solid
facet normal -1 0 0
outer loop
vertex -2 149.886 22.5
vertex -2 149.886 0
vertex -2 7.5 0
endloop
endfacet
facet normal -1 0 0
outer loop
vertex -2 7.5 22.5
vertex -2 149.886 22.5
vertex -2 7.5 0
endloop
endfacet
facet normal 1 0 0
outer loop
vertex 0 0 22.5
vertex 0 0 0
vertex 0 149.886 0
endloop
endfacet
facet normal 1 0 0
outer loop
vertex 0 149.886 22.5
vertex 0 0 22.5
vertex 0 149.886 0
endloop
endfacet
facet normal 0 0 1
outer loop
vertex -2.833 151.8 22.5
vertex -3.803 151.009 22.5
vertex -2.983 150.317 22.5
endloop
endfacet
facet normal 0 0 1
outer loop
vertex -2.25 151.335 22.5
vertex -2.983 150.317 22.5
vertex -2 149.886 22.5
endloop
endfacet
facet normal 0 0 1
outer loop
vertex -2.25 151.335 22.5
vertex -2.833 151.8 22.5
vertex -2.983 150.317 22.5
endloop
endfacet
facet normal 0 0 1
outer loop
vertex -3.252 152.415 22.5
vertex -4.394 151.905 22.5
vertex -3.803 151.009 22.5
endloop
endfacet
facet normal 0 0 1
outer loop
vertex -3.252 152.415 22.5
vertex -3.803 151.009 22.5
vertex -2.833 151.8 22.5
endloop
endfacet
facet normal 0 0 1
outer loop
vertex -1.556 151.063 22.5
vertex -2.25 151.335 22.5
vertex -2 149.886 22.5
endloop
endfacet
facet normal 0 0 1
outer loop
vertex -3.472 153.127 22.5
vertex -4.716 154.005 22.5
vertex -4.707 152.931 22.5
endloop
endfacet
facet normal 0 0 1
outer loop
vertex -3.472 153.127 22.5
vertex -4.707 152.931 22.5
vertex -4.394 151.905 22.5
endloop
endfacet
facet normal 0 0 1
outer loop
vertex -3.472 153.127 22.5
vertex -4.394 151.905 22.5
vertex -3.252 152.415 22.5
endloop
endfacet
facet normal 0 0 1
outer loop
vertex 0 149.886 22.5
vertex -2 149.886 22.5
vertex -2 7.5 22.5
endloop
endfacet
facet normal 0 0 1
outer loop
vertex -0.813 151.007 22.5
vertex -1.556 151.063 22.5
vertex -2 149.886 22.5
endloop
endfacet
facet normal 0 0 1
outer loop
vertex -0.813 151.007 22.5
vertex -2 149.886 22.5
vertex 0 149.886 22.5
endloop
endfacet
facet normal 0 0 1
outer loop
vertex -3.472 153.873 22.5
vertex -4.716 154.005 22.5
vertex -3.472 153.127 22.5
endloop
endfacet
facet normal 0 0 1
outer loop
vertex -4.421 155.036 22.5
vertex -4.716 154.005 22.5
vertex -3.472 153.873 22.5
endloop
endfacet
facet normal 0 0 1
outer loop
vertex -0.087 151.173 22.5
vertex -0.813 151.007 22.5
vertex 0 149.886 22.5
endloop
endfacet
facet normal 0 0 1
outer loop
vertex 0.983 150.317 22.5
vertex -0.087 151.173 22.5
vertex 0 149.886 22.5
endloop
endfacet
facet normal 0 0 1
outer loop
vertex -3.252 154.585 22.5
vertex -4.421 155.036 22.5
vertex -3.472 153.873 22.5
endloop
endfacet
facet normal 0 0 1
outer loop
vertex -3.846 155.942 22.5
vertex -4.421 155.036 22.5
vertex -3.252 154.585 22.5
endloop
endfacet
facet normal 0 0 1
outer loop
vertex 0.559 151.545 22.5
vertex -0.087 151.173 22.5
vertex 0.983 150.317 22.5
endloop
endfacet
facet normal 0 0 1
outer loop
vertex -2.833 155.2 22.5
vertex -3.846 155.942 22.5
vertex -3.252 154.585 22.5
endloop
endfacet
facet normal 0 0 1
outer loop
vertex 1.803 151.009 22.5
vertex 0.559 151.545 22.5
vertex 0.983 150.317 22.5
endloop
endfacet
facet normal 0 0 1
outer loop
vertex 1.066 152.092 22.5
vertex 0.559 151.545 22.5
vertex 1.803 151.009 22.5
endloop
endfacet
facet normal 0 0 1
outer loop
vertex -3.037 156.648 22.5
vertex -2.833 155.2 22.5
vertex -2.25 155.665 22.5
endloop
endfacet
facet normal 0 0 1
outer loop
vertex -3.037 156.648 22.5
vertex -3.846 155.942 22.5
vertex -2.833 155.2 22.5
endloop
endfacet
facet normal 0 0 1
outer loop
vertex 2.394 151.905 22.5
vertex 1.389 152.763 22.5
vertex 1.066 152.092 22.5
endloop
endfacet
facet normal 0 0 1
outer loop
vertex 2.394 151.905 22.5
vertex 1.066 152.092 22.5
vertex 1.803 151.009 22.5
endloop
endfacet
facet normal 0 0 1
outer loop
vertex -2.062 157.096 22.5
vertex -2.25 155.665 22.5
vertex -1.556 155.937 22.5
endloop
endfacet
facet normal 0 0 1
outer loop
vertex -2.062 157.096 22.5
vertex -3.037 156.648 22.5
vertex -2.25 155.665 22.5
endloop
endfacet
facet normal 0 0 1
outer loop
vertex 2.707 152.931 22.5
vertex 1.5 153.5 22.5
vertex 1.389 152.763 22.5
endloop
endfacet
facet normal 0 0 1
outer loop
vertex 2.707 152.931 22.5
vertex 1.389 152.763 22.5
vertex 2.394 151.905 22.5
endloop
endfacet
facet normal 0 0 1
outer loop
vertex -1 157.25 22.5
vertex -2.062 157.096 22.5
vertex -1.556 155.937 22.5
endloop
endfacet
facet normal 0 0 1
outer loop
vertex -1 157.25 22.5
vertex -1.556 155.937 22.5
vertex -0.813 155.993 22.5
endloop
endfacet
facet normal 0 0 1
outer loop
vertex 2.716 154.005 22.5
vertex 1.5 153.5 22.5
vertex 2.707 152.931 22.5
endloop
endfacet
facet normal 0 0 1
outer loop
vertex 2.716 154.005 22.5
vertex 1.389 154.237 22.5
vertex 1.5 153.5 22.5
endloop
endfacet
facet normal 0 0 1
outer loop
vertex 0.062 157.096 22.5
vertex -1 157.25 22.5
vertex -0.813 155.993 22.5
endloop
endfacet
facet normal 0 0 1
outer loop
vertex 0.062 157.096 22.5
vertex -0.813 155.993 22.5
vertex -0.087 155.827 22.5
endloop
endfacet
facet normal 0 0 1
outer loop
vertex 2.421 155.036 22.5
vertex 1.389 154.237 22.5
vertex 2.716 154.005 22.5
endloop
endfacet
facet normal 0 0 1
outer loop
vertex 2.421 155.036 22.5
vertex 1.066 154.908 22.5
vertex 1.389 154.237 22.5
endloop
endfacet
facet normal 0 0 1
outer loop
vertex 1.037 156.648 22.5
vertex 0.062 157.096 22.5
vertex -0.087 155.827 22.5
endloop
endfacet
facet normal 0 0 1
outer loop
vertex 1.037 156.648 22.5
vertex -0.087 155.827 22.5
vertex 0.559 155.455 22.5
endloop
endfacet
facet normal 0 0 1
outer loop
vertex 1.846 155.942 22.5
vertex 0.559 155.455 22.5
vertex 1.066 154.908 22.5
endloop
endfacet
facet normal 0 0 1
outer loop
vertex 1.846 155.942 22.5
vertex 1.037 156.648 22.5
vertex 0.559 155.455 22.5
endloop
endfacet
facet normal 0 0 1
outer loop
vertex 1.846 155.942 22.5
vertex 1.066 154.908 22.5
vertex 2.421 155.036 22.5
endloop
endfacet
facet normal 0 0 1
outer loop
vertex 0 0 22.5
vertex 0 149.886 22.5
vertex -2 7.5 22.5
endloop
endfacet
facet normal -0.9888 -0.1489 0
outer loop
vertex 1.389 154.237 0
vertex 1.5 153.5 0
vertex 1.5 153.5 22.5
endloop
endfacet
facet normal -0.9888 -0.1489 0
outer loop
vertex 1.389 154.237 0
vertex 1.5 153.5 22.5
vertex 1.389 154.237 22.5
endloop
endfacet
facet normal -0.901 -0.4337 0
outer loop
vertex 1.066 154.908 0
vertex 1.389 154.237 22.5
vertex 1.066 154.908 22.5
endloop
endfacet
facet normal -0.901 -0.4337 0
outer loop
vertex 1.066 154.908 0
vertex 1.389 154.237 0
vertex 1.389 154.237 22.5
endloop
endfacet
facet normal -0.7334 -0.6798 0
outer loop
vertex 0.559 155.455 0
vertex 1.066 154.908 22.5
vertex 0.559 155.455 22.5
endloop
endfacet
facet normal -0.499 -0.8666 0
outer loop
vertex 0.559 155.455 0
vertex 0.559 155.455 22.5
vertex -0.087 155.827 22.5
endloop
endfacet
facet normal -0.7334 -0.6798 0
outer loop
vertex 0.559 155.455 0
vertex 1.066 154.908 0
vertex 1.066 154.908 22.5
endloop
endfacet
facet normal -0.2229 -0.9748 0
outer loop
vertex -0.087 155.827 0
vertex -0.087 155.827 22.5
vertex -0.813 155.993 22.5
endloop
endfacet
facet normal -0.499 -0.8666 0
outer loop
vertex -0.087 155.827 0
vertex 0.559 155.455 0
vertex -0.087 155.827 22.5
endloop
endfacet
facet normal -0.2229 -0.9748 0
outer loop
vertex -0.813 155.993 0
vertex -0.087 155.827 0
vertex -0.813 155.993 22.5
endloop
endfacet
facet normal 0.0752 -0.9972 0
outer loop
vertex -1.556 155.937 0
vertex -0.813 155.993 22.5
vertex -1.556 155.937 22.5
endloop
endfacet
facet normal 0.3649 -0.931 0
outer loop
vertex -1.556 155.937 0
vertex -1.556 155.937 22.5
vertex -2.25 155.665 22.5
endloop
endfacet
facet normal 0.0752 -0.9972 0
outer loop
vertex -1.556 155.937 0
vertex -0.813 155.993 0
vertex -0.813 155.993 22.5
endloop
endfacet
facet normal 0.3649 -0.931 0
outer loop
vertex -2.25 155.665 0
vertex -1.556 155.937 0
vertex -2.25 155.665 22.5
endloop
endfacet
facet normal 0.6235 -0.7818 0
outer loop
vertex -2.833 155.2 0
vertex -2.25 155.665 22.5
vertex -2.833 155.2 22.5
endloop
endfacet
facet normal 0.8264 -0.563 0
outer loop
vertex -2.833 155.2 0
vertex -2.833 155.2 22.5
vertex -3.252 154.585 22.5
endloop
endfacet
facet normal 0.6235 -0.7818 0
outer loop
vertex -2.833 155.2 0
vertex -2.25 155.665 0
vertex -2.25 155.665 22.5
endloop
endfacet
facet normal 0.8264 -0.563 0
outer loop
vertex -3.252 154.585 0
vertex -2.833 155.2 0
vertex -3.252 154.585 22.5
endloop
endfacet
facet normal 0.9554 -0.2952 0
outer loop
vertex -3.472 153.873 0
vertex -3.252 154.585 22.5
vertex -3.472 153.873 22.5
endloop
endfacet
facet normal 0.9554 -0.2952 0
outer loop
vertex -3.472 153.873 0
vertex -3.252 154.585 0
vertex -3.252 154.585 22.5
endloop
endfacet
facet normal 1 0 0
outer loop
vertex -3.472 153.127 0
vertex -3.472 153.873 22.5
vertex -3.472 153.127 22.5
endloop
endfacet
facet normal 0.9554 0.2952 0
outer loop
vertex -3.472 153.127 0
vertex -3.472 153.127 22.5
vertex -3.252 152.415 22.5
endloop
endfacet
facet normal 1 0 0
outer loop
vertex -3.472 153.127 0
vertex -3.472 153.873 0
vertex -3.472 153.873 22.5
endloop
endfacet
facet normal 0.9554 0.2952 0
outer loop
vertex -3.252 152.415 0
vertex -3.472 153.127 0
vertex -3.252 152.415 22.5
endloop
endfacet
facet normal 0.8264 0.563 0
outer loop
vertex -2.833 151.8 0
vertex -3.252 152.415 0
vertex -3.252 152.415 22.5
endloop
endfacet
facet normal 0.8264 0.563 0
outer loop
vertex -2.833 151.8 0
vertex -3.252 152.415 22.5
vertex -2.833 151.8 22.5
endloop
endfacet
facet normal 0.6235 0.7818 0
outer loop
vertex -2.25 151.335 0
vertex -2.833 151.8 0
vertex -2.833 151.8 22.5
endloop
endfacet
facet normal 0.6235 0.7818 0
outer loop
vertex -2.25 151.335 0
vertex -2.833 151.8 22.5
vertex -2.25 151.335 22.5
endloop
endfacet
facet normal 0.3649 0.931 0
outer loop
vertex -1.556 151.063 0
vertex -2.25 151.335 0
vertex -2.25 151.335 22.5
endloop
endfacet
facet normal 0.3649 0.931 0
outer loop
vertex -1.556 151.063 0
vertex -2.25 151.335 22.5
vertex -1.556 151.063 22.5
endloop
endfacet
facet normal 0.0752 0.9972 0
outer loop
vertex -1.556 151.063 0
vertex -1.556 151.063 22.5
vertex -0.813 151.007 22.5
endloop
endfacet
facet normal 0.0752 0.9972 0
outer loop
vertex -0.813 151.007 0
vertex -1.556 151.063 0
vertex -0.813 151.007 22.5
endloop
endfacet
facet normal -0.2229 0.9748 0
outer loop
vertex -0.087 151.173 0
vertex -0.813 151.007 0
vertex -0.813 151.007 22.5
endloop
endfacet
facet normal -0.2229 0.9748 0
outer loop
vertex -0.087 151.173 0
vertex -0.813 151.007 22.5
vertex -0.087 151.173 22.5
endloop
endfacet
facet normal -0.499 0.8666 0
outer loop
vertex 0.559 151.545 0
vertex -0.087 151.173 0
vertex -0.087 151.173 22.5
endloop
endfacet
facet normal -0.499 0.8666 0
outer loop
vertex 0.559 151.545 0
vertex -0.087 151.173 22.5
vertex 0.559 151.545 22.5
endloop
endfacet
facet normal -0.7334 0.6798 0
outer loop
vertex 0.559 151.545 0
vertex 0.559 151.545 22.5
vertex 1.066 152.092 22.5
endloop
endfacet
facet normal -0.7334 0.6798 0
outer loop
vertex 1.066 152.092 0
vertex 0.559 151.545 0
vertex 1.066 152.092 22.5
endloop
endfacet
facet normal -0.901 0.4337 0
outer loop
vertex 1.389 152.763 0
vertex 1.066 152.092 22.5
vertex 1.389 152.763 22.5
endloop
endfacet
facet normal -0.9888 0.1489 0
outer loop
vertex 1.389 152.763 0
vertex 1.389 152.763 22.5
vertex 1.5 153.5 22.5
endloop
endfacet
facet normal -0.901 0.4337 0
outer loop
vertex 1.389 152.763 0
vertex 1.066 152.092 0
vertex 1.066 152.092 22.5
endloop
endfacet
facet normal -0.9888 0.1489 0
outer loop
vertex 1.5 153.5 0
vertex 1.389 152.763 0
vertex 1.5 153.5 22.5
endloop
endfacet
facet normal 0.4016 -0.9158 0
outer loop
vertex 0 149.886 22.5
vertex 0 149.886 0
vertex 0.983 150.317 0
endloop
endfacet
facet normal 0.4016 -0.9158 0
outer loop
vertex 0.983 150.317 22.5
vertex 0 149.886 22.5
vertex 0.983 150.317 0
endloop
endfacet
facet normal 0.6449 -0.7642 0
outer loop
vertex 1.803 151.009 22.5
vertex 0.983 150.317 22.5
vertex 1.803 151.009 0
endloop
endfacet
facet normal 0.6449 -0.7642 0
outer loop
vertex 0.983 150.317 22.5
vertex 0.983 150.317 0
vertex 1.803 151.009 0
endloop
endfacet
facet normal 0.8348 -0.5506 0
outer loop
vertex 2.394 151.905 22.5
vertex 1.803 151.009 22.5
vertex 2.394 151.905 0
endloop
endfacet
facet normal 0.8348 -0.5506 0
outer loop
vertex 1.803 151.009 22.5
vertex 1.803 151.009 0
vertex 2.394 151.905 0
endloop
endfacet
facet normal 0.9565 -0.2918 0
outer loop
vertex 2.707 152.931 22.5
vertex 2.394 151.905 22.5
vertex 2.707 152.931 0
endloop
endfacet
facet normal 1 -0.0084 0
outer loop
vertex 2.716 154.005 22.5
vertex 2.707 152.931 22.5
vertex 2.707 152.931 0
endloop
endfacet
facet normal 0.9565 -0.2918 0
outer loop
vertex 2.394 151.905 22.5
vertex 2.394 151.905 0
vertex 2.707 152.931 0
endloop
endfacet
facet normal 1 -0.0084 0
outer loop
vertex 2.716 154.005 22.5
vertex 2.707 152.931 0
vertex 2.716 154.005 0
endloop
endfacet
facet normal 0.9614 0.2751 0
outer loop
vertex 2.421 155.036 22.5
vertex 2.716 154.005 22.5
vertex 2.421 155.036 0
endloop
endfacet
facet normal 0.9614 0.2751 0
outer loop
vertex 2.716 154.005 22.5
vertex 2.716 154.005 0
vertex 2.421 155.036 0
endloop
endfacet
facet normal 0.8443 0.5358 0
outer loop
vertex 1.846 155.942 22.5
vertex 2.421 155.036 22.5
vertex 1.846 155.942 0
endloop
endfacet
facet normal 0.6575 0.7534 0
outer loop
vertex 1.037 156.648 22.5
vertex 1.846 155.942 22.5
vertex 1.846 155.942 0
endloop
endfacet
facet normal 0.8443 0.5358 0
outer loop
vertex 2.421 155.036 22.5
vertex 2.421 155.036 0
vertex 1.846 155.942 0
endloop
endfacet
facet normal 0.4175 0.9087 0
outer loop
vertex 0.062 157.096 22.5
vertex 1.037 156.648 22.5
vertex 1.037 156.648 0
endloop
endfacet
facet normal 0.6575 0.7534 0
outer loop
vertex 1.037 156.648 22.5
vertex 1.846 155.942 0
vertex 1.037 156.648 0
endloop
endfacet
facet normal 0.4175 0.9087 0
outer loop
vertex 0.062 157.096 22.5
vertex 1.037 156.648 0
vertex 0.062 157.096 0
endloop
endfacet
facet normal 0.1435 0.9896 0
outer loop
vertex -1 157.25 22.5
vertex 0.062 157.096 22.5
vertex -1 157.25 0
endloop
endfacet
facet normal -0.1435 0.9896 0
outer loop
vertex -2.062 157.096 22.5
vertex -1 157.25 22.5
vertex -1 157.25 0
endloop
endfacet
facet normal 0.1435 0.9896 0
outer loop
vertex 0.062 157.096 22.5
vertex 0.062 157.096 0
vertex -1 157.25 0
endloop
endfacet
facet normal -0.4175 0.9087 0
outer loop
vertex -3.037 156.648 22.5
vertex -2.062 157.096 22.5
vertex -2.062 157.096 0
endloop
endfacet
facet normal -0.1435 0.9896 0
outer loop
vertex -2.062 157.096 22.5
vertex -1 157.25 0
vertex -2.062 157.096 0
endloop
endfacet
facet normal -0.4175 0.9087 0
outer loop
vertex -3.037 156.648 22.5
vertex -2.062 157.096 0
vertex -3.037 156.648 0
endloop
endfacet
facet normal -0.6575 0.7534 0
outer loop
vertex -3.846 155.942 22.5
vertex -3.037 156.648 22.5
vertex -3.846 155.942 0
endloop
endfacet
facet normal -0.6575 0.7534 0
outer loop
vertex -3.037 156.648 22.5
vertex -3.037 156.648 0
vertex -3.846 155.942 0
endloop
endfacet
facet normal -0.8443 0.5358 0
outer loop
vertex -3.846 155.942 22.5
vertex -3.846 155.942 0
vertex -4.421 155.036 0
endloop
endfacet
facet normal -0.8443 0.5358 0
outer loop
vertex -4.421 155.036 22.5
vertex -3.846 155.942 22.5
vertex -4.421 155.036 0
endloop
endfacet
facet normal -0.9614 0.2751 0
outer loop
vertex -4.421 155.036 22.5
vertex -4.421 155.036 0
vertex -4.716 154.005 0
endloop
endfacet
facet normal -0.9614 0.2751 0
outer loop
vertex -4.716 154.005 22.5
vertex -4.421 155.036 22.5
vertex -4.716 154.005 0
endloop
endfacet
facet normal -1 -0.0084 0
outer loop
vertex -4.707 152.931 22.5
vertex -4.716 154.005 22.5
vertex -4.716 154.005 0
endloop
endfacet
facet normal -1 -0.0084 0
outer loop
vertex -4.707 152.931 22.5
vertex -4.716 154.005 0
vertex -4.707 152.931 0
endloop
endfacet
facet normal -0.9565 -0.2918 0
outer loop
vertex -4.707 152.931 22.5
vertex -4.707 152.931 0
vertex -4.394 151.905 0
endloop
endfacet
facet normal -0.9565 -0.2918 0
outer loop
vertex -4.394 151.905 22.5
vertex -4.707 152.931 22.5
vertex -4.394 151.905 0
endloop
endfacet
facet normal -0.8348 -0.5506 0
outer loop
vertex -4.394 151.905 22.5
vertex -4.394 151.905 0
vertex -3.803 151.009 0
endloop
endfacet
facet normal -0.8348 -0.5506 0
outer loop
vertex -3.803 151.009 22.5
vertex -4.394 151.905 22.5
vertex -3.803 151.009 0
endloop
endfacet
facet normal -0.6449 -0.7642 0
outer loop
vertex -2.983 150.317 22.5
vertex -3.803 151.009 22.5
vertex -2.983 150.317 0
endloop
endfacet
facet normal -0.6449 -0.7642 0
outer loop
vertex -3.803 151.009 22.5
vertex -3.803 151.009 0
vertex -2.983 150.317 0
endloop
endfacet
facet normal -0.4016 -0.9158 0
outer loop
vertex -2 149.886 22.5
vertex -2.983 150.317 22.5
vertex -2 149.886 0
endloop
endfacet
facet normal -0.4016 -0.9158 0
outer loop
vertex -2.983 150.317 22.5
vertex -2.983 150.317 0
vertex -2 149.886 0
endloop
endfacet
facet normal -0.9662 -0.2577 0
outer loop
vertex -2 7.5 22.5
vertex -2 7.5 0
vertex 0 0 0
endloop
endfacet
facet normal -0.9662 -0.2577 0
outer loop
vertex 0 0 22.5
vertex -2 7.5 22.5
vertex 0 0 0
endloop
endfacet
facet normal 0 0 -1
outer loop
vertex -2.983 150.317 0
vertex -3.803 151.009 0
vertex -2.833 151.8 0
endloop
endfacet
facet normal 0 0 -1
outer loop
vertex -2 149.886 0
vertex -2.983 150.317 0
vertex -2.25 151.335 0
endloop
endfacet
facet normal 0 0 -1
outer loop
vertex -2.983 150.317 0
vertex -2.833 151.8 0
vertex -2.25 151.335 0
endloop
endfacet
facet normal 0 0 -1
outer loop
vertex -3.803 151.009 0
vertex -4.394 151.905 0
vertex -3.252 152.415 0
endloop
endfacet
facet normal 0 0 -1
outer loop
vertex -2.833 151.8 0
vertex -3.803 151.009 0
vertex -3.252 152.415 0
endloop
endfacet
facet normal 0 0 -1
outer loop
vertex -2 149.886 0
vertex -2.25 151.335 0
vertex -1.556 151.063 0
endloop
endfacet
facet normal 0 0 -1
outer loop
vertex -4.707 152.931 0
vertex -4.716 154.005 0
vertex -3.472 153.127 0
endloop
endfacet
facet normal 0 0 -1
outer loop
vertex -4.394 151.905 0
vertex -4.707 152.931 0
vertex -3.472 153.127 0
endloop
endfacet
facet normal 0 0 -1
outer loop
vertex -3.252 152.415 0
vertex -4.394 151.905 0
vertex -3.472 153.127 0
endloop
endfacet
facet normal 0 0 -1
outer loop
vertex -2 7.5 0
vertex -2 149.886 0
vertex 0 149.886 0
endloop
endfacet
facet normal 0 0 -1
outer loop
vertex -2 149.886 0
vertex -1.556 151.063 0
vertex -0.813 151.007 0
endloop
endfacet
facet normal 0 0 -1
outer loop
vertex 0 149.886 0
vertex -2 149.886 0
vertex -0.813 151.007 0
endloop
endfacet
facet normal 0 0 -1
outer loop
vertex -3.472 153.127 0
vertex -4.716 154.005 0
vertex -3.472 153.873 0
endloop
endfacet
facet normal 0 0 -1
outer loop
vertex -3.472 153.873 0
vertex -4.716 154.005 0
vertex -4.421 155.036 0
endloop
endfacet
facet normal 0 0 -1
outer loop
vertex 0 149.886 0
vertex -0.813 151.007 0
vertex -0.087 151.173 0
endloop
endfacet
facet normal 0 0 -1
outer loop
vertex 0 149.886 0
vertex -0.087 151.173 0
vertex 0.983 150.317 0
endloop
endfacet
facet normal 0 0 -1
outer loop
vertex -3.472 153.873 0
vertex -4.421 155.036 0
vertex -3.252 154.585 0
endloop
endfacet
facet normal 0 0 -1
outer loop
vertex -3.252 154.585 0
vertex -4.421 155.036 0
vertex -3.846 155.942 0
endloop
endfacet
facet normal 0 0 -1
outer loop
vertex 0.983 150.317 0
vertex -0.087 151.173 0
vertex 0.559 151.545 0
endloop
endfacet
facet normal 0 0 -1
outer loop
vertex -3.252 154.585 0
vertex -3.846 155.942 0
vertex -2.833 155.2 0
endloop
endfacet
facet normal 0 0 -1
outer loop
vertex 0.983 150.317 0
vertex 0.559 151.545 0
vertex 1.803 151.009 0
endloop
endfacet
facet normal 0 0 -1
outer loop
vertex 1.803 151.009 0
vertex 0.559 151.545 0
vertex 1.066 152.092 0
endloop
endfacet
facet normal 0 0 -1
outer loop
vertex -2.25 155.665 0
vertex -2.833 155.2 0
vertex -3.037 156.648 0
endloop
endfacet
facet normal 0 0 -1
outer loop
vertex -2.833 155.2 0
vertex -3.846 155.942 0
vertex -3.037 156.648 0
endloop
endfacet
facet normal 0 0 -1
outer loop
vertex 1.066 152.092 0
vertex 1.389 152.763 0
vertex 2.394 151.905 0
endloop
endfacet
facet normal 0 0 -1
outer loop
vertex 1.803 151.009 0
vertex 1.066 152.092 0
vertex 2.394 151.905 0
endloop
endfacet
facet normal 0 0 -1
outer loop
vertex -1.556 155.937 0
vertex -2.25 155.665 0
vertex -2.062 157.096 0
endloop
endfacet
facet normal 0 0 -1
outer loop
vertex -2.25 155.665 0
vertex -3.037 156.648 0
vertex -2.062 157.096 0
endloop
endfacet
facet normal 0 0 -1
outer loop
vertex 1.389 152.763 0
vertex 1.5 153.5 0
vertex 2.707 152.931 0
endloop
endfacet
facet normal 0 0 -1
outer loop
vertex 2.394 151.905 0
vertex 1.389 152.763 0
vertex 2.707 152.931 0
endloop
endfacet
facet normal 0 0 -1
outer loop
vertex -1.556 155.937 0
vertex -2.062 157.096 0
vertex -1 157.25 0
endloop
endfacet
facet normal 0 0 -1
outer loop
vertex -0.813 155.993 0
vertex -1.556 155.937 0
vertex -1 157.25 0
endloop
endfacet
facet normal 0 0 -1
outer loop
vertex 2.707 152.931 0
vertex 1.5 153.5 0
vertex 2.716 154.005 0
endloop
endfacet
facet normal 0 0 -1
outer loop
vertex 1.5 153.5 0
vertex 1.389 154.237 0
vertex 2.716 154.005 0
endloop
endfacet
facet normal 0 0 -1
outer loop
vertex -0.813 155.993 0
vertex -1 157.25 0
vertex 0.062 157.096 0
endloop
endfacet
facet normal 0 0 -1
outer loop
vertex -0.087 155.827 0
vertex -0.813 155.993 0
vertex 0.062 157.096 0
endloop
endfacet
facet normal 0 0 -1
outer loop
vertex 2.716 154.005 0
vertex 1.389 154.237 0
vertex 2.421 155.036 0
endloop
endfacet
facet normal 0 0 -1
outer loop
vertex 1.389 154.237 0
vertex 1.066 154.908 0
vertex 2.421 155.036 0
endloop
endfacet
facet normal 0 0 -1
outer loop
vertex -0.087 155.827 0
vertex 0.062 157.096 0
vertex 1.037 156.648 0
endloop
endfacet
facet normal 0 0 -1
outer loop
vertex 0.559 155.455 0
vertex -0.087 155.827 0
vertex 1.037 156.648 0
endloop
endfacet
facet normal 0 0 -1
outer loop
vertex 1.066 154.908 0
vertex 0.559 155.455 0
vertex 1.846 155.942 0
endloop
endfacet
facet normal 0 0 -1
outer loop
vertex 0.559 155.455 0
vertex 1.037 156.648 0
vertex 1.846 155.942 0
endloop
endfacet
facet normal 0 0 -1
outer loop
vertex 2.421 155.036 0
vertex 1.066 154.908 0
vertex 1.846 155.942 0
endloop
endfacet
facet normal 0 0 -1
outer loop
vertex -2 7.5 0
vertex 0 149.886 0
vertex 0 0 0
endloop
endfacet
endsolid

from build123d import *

# Parameters (mm, degrees)
CROQUIS3_R              = 3.75
CROQUIS3_R_2            = 2.5
SALIENTE_EXTRUIR1_DEPTH = 22.5


with BuildPart() as part:
    # Croquis3 → Saliente-Extruir1 (new body)
    with BuildSketch(Plane.XY):
        with Locations((-1, 153.5)):
            Circle(CROQUIS3_R)
        with Locations((-1, 153.5)):
            Circle(CROQUIS3_R_2, mode=Mode.SUBTRACT)
        with BuildLine():
            Line((0, 0), (0, 149.885791926))
            ThreePointArc((0, 149.885791926), (-1, 149.75), (-2, 149.885791926))
            Line((-2, 149.885791926), (-2, 7.5))
            Line((-2, 7.5), (0, 0))
        make_face()
    extrude(amount=SALIENTE_EXTRUIR1_DEPTH)


solid = part.part
